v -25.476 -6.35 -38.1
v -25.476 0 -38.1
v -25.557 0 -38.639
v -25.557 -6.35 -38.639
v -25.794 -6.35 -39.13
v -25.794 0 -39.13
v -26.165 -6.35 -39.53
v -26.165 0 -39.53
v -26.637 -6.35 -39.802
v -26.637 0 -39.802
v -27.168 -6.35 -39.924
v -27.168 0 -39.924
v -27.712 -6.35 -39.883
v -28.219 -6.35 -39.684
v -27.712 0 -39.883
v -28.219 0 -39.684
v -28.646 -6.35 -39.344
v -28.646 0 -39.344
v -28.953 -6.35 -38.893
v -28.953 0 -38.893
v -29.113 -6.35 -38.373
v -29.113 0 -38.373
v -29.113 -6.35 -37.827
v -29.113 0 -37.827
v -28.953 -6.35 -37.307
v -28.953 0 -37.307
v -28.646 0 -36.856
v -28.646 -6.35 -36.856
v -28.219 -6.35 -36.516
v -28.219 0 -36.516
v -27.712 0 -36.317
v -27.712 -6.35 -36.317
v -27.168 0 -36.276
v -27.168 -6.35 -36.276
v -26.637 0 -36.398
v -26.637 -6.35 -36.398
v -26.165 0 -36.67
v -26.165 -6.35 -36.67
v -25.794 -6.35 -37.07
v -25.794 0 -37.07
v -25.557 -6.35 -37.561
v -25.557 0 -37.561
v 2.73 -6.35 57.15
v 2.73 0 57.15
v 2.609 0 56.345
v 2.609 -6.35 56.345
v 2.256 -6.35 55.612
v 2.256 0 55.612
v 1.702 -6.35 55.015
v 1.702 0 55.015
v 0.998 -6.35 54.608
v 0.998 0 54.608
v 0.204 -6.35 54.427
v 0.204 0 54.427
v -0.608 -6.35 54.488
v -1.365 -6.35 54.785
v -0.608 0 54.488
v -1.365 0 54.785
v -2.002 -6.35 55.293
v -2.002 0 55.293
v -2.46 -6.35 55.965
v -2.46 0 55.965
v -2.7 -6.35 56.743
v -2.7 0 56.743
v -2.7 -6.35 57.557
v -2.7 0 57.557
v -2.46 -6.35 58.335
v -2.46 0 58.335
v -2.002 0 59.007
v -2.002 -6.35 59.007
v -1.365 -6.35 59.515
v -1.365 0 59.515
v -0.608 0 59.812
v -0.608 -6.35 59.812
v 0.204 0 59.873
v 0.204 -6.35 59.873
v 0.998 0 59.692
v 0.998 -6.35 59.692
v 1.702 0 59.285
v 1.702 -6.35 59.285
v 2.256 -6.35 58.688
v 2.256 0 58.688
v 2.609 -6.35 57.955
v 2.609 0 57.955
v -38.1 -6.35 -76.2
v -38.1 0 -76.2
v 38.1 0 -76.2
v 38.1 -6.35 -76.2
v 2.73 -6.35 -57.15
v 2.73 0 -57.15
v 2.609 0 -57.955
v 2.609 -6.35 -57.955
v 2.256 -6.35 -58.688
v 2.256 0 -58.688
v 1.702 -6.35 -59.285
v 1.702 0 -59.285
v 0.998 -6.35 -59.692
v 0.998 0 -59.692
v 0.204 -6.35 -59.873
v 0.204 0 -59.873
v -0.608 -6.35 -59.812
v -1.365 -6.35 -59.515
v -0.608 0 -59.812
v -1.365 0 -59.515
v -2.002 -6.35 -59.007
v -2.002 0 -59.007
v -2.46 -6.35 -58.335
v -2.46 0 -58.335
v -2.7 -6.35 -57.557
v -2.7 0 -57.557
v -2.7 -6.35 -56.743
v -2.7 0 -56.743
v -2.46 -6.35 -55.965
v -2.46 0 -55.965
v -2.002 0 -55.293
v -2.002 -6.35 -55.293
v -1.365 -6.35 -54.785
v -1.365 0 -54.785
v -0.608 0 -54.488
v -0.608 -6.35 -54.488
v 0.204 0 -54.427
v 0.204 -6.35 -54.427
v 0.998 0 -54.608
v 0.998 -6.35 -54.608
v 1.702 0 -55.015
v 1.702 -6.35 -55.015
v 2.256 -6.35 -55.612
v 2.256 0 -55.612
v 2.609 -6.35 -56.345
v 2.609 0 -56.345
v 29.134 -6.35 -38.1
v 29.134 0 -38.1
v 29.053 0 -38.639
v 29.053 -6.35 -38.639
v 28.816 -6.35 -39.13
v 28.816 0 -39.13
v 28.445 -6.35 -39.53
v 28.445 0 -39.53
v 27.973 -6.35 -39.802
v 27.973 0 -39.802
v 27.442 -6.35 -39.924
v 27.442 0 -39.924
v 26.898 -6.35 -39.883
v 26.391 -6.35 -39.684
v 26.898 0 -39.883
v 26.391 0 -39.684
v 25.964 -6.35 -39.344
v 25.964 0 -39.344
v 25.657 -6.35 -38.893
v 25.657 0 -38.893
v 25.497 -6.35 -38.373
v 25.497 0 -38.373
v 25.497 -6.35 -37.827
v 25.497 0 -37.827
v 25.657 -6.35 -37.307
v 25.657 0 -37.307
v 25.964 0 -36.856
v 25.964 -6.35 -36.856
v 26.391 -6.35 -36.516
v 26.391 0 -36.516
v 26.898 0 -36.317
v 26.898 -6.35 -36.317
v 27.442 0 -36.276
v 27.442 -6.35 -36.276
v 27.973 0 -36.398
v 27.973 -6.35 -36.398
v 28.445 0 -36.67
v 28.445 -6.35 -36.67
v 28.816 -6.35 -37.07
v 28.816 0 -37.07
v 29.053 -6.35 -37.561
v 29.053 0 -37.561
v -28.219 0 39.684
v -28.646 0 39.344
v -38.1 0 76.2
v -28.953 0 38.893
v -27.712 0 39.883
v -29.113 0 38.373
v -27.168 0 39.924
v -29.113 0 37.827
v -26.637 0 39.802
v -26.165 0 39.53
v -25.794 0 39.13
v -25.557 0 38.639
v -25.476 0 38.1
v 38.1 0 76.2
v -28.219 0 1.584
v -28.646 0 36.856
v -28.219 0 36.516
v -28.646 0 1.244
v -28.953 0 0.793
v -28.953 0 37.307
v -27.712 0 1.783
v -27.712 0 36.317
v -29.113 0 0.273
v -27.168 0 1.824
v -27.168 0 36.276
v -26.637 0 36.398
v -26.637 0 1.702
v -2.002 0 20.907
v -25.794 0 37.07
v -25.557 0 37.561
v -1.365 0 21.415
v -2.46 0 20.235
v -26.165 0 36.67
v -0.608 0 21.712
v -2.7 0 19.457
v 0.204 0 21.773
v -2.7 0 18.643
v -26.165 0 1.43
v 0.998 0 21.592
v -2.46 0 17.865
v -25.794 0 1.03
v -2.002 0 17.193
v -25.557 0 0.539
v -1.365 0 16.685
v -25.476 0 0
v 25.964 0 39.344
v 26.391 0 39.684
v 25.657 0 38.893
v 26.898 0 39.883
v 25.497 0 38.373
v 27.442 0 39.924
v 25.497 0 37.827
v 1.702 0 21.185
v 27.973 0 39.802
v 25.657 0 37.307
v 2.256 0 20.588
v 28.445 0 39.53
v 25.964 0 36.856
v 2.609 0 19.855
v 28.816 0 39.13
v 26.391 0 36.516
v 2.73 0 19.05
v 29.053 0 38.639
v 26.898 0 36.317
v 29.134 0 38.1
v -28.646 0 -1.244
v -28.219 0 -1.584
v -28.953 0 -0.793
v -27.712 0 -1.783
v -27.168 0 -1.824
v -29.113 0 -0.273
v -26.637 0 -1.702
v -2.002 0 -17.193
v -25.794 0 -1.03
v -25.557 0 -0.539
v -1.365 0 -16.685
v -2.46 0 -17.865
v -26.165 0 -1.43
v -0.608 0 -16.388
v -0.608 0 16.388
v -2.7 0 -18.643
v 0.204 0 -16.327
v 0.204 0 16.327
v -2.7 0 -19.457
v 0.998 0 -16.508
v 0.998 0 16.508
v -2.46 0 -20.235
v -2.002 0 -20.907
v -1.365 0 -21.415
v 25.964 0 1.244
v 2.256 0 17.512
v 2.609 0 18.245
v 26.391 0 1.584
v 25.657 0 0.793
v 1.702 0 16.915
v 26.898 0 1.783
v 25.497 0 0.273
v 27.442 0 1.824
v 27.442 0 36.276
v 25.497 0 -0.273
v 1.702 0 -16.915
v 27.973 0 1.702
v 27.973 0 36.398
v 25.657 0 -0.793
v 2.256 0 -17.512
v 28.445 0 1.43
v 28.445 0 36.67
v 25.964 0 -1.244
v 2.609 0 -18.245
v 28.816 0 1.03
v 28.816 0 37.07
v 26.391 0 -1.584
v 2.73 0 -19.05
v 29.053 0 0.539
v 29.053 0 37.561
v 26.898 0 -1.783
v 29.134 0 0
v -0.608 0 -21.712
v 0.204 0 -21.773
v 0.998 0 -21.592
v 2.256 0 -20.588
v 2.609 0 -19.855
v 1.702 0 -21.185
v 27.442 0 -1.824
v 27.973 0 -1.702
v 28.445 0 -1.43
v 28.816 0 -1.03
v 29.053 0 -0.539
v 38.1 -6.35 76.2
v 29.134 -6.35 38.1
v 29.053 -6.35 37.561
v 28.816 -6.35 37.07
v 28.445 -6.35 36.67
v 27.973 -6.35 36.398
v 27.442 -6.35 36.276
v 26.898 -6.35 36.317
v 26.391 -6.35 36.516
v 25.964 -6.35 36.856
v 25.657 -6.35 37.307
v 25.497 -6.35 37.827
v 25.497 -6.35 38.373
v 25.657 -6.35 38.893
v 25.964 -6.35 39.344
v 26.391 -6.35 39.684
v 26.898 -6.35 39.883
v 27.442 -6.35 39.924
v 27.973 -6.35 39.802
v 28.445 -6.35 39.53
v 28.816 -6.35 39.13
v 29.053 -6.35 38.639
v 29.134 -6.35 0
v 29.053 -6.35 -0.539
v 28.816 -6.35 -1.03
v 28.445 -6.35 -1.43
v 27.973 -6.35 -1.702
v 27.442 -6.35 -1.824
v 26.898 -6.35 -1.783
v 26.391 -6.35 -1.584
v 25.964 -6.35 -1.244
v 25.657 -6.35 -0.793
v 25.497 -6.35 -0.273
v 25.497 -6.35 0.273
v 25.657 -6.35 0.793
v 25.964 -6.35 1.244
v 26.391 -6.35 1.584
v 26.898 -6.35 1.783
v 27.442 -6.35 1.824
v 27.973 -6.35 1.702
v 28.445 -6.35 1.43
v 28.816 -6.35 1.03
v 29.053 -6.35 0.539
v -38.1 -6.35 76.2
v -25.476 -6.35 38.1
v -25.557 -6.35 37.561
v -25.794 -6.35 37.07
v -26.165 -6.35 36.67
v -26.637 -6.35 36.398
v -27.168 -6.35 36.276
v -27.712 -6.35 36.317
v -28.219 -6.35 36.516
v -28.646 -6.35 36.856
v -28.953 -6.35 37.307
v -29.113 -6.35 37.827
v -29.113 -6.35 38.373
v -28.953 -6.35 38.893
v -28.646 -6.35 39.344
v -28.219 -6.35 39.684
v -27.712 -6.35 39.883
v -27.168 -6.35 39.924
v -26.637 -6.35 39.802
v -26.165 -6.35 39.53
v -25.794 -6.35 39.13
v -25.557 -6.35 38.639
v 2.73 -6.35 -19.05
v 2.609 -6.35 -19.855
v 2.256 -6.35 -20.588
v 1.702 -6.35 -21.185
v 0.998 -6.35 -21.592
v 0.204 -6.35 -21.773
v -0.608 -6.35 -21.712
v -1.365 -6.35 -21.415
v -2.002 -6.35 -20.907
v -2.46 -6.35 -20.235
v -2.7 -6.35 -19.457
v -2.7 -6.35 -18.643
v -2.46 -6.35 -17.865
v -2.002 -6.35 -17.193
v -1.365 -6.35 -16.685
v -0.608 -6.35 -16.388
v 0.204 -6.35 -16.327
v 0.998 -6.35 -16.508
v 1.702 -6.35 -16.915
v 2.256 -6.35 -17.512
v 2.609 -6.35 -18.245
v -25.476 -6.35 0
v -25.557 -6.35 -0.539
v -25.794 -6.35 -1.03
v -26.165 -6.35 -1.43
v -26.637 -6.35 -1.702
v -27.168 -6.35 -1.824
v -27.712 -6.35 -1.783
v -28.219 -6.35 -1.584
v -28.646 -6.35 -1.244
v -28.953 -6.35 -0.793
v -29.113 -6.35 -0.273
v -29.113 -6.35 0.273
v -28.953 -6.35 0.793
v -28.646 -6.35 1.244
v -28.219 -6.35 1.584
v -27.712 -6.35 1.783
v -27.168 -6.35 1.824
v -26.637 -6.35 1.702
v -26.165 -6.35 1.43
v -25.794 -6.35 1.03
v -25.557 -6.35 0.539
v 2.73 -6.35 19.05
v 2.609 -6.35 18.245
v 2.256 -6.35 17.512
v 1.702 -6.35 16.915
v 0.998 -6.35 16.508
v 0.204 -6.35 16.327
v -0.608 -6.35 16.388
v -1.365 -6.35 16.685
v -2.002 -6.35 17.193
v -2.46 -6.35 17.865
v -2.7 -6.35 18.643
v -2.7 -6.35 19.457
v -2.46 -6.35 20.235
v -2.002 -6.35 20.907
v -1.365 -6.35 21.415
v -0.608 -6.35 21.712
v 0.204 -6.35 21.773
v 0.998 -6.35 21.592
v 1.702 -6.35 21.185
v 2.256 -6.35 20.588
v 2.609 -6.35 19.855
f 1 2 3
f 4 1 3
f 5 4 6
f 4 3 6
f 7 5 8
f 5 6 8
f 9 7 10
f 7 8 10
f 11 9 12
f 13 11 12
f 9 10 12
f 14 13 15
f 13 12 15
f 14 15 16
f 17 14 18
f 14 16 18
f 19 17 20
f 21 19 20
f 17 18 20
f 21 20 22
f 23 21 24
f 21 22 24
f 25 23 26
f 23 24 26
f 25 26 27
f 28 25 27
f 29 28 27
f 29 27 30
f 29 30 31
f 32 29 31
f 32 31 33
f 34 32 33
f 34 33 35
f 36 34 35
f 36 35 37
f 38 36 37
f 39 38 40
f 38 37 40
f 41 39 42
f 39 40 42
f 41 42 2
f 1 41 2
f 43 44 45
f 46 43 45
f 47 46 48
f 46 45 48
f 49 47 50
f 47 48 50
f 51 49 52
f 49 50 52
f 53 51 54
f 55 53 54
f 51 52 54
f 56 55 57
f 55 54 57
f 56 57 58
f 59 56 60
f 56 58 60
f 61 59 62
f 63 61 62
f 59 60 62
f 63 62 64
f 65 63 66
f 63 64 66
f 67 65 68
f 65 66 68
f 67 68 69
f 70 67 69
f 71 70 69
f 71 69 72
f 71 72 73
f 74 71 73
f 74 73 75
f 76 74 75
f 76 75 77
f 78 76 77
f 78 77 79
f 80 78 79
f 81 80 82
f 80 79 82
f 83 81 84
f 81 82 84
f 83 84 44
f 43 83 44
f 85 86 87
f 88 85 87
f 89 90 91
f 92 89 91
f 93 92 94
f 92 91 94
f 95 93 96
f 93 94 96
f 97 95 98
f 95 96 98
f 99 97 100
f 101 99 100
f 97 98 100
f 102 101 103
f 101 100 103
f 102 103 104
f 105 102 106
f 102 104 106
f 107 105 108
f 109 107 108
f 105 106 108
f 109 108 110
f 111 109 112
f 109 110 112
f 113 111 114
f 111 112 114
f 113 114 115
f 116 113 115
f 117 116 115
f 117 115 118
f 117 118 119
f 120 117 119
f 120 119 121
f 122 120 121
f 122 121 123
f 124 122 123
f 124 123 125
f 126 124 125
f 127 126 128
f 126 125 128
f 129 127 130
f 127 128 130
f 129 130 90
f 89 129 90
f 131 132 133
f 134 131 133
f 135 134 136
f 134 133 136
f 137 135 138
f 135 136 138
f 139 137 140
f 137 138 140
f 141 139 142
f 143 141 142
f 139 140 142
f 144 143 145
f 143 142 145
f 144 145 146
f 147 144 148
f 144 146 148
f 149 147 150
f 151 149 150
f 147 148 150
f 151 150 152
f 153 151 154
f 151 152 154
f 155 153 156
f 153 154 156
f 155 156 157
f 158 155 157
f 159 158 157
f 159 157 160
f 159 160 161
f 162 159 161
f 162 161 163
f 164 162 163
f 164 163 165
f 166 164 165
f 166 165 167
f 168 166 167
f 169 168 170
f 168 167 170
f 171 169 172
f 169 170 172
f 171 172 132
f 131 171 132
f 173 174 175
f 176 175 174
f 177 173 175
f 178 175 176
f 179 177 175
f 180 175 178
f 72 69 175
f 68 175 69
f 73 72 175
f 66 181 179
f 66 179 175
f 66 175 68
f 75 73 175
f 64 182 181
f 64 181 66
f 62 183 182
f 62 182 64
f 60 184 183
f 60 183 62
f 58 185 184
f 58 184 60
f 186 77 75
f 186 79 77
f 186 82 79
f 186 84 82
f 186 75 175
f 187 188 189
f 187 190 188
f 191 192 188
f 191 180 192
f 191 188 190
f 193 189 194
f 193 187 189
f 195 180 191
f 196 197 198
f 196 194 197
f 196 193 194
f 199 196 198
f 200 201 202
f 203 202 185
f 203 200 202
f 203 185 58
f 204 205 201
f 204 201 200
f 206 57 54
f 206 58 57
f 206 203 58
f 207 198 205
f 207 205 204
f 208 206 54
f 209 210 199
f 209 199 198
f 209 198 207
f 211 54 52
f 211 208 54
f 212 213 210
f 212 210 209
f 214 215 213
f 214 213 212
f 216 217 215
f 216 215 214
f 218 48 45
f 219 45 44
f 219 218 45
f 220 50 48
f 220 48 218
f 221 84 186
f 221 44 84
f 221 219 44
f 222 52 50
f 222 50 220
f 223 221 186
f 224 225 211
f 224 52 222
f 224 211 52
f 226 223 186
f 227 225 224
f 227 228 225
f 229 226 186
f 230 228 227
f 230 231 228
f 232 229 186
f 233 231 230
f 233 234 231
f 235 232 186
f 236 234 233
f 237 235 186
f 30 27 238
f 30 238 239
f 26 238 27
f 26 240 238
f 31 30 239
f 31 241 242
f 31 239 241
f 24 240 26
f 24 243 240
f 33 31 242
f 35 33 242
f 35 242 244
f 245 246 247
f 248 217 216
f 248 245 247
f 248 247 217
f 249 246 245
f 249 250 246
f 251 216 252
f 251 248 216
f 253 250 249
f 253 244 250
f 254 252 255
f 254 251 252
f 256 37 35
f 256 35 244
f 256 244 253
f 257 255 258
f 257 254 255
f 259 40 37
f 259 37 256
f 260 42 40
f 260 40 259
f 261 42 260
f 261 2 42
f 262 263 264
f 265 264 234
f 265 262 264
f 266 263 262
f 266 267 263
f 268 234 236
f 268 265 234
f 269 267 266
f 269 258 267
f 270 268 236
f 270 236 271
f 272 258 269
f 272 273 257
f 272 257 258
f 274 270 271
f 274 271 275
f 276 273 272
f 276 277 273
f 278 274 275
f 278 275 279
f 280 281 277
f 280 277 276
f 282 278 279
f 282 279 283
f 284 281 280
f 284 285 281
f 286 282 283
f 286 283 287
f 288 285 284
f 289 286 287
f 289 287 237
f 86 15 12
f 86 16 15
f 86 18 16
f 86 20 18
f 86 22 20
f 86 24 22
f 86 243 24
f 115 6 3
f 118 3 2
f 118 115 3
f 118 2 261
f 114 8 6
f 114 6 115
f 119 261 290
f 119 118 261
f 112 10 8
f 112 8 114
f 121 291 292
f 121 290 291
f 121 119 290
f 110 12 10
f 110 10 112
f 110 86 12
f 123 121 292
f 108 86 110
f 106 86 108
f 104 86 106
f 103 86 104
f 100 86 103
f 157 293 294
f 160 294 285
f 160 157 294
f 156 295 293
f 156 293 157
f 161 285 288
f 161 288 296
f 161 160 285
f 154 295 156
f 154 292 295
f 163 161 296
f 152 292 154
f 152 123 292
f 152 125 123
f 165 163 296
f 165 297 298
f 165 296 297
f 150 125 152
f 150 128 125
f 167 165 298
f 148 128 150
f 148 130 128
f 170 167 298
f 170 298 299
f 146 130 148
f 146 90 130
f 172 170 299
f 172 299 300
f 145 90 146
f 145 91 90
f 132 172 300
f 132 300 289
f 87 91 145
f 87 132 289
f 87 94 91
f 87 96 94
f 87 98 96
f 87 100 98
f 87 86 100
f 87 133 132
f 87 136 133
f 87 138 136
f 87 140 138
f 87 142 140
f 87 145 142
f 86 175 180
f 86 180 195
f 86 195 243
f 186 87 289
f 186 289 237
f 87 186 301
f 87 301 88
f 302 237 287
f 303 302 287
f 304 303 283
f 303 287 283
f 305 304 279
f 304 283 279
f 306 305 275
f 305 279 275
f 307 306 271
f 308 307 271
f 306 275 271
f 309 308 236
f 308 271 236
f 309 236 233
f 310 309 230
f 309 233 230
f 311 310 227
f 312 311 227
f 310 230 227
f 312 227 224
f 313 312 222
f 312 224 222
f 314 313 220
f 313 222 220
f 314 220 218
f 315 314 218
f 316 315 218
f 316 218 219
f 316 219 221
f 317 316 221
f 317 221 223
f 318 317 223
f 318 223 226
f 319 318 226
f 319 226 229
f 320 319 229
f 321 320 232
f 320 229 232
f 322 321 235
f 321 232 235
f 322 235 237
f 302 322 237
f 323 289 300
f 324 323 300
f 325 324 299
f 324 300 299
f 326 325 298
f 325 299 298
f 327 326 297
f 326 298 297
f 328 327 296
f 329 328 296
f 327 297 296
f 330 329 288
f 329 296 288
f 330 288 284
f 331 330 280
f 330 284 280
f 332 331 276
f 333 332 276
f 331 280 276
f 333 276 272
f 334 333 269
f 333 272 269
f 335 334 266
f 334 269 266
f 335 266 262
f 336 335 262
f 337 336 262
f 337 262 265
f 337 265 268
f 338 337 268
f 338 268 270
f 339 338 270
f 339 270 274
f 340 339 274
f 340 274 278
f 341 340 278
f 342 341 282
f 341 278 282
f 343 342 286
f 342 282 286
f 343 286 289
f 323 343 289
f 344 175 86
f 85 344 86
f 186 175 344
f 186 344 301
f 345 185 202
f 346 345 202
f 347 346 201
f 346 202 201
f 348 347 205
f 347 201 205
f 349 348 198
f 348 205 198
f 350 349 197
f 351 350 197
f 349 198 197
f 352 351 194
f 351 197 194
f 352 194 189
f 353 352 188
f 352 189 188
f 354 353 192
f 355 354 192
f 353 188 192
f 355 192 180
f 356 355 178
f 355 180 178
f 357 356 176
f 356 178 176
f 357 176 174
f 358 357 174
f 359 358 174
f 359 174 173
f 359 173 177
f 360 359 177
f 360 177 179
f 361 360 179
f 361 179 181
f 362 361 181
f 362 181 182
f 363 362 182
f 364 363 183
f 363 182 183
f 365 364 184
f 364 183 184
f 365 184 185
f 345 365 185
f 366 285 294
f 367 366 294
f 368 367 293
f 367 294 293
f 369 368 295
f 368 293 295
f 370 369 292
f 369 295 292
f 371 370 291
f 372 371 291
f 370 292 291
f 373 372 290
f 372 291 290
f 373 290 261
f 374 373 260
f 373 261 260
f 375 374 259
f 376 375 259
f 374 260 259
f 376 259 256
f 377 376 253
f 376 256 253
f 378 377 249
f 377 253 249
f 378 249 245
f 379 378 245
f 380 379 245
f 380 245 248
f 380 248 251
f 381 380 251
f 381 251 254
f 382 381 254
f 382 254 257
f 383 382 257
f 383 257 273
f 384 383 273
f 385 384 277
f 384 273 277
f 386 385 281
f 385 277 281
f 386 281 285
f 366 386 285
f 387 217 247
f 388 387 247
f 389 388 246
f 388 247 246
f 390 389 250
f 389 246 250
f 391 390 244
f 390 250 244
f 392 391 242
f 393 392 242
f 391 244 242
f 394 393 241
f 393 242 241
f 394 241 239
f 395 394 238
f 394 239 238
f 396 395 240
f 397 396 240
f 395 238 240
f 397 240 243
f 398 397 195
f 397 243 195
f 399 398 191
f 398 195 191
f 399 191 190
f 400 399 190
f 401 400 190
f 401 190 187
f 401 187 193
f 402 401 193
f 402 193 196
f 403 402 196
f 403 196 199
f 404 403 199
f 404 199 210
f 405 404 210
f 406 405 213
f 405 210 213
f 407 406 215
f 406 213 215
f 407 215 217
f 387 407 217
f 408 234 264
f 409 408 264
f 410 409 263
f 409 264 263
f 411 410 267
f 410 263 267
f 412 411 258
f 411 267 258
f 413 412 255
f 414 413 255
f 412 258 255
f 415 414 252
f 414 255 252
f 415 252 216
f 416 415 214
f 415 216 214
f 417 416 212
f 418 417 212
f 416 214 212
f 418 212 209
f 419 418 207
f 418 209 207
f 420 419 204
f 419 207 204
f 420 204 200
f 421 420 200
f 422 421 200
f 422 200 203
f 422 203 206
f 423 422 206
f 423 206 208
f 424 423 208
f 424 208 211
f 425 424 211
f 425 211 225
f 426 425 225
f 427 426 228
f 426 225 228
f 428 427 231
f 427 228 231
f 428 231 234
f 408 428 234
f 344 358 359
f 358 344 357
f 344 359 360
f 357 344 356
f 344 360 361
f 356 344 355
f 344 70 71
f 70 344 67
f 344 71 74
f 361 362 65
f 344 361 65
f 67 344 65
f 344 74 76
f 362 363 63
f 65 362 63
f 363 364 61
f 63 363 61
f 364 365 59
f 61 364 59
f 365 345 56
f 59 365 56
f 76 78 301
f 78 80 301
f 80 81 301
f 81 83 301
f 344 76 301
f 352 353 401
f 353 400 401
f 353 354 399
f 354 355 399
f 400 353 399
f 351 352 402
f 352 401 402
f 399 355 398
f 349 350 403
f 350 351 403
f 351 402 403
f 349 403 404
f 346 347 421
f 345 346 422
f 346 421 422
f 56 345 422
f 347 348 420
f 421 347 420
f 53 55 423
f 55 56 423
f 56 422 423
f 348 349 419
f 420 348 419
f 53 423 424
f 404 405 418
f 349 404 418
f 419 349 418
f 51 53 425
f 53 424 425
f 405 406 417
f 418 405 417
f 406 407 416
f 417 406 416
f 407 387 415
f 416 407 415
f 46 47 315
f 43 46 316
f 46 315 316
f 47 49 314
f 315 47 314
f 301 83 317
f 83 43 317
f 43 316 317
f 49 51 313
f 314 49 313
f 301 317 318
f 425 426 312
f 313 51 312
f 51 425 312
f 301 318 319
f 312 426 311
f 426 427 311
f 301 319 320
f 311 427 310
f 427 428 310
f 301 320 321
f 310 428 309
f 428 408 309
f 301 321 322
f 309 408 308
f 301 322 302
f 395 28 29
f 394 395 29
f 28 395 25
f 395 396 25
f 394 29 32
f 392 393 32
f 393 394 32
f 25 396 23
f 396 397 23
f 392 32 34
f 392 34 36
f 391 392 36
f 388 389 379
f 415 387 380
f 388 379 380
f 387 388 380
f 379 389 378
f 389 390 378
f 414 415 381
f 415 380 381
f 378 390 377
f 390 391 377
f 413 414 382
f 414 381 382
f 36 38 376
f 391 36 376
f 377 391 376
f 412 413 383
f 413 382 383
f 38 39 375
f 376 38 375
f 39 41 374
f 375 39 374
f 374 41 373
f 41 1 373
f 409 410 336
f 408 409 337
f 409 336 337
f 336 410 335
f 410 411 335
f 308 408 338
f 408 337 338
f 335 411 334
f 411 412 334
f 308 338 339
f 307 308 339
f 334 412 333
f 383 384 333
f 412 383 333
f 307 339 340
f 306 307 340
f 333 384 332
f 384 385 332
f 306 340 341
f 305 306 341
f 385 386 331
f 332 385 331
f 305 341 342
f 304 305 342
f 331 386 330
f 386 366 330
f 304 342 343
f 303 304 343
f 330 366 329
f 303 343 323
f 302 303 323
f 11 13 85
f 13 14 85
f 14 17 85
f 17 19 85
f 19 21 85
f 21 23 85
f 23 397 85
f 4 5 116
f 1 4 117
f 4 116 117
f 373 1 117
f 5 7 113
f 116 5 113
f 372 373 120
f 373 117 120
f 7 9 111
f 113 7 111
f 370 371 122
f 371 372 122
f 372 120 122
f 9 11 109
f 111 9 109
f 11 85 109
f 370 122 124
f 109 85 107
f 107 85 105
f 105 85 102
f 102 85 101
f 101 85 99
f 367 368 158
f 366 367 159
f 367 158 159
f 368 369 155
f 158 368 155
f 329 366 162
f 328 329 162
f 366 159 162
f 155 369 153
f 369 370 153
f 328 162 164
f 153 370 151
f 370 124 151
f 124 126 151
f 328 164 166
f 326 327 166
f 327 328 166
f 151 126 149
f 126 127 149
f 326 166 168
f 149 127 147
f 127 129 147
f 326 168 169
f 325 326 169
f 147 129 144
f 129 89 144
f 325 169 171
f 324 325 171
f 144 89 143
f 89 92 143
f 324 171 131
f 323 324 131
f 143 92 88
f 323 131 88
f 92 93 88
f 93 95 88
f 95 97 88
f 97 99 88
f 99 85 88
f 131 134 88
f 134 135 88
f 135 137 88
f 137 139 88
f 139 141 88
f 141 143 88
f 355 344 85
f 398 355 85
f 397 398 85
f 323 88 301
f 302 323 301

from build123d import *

# Parameters (mm, degrees)
SKETCH1_W           = 76.2
SKETCH1_H           = 152.4
SKETCH1_R           = 2.7305
SKETCH1_R_2         = 1.8288
BOSS_EXTRUDE1_DEPTH = 6.35


with BuildPart() as part:
    # Sketch1 → Boss-Extrude1 (new body)
    with BuildSketch(Plane(origin=(0, 0, 0), x_dir=(1, 0, 0), z_dir=(0, 1, 0))):
        Rectangle(SKETCH1_W, SKETCH1_H)
        with Locations((0, 57.15)):
            Circle(SKETCH1_R, mode=Mode.SUBTRACT)
        with Locations((0, 19.05)):
            Circle(SKETCH1_R, mode=Mode.SUBTRACT)
        with Locations((0, -19.05)):
            Circle(SKETCH1_R, mode=Mode.SUBTRACT)
        with Locations((0, -57.15)):
            Circle(SKETCH1_R, mode=Mode.SUBTRACT)
        with Locations((27.305, 38.1)):
            Circle(SKETCH1_R_2, mode=Mode.SUBTRACT)
        with Locations((27.305, 0)):
            Circle(SKETCH1_R_2, mode=Mode.SUBTRACT)
        with Locations((27.305, -38.1)):
            Circle(SKETCH1_R_2, mode=Mode.SUBTRACT)
        with Locations((-27.305, 0)):
            Circle(SKETCH1_R_2, mode=Mode.SUBTRACT)
        with Locations((-27.305, -38.1)):
            Circle(SKETCH1_R_2, mode=Mode.SUBTRACT)
        with Locations((-27.305, 38.1)):
            Circle(SKETCH1_R_2, mode=Mode.SUBTRACT)
    extrude(amount=-BOSS_EXTRUDE1_DEPTH)


solid = part.part
